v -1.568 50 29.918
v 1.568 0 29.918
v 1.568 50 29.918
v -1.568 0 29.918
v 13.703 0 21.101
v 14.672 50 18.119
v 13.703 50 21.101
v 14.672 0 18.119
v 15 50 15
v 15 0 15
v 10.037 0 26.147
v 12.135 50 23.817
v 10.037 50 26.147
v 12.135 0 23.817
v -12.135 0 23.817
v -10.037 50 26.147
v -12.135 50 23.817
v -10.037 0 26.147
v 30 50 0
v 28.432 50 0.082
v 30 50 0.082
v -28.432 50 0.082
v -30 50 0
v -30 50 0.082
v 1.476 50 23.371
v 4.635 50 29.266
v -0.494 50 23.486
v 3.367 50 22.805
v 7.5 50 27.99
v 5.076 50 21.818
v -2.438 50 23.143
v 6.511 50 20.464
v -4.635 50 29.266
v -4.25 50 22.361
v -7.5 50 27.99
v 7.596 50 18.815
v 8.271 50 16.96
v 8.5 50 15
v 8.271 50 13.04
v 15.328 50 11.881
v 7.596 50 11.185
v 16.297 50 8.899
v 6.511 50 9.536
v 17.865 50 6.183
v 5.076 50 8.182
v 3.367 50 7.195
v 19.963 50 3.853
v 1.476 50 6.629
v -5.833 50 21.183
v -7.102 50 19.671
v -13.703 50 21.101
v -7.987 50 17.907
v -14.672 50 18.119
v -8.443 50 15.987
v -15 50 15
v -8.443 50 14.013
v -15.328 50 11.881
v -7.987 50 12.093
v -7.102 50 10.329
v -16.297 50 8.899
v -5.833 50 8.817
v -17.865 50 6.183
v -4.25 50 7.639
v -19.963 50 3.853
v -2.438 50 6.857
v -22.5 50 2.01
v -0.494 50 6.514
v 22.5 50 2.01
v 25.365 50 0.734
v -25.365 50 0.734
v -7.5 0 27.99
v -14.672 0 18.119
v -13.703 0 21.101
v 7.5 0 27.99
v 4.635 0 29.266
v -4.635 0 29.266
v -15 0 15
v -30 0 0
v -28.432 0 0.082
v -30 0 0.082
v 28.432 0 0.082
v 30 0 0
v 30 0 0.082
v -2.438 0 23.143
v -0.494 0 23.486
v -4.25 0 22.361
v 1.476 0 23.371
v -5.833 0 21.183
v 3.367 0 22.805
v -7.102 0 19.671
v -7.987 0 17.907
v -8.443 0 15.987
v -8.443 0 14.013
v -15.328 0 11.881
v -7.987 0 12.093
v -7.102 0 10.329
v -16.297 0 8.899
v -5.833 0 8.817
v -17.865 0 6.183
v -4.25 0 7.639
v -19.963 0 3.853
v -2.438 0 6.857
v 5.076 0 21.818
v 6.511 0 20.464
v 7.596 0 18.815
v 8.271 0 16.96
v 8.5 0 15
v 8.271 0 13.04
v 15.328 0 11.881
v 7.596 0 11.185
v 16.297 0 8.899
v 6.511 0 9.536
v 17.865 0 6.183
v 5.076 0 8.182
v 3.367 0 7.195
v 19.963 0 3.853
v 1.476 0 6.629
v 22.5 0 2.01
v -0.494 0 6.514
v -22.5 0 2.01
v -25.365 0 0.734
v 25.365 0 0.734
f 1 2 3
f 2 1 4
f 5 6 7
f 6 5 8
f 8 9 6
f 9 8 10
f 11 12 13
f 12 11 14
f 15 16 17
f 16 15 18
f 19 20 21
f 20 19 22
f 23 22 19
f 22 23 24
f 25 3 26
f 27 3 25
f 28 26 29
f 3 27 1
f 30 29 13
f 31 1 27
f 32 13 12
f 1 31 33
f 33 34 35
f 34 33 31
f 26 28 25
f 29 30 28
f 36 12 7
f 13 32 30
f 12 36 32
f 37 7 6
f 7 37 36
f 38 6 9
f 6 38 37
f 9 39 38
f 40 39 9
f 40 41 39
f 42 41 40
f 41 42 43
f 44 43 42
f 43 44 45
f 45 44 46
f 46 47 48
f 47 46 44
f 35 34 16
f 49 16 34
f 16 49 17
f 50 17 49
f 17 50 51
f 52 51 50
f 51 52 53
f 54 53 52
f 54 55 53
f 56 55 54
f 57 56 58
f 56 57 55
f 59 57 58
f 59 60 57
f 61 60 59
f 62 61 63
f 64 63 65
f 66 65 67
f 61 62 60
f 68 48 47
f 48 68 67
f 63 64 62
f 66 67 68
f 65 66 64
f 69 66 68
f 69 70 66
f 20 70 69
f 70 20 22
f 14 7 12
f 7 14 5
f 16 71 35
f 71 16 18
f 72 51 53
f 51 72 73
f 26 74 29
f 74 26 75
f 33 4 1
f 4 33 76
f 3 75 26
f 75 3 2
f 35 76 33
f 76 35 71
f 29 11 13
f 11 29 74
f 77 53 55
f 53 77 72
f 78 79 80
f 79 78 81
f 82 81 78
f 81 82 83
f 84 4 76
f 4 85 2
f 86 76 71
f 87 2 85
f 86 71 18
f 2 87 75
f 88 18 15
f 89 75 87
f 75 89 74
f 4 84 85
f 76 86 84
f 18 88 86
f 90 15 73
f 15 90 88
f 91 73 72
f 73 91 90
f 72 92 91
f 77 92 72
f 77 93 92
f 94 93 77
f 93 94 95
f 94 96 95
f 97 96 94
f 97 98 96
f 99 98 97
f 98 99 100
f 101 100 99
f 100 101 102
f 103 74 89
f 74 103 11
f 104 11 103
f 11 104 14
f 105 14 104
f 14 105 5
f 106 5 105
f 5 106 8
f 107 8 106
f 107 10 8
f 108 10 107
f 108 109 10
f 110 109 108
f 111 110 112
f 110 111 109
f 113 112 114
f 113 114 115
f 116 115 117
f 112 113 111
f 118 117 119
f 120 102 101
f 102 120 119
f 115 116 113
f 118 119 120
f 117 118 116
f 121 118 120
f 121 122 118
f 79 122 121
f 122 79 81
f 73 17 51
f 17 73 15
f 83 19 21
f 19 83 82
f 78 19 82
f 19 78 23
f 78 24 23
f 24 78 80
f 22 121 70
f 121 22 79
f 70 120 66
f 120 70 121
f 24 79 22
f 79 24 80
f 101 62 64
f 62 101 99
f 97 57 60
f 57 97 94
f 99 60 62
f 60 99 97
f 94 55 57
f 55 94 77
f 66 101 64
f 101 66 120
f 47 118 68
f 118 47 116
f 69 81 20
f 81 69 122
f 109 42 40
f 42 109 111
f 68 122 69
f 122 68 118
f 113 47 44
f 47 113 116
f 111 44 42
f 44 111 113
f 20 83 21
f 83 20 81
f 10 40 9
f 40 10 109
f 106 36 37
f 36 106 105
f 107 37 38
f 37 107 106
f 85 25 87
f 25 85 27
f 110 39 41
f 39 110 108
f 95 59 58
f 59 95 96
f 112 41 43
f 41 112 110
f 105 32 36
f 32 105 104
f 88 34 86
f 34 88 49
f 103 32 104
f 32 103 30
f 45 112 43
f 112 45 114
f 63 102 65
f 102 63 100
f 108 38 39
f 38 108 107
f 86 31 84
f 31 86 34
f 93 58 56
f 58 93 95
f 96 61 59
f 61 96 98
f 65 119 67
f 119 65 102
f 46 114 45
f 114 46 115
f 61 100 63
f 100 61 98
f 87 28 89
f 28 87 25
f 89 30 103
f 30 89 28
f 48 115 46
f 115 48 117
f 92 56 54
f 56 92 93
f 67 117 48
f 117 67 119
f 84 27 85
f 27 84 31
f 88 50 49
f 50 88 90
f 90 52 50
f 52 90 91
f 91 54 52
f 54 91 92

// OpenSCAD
// file: variables.scad
// General
DIFFERENCE_FIX = 0.1;
DIFFERENCE_FIX_NEGATIVE = -1 * DIFFERENCE_FIX;
DIFFERENCE_FIX_2 = 2 * DIFFERENCE_FIX;

// Hull
hullThickness = 3;

// Nose
noseLength = 100;
noseWidth = 70 - hullThickness * 2;
noseTopThickness = 1;
noseTopOffsetZ = 60;
noseTopEndOffset = 20;
noseTopSharpnessFactor = 4;
noseBotttomSharpnessFactor = 3;
noseTopThicknessFactor = 1;
noseBottomThicknessFactor = 3;

// Hull
hullLength = 500 - hullThickness * 2;
hullSpacing = 100;
hullCutoutWidth = 46;
hullCutoutHeight = 150;
hullHeight = noseTopOffsetZ + noseTopThickness + hullThickness;

// Hull Mounts
hullMountHole = 8.5;
hullMountHeight = 30;
hullMountWidth = 30;
hullMountDepth = 50;
hullMountPinRadius = 5;
hullMountPinOffset = 10;
hullMountOffsetY = 100;

// Rod Connectors
rodConnectorWidth = 30;
rodConnectorRadius = 15;
rodConnectorTopOffset = 3;
rodConnectorOffsetX = 30;

// Lid
lidLip = 5;
lidThickness = 3;
lidGap = 0.4;
// main file
include <variables.scad>

module hullMount() {
    difference() {
        hullMountBody();

        // Hole
        translate([0, hullMountDepth + DIFFERENCE_FIX, hullMountHeight / 2])
        rotate([90, 0, 0])
        cylinder(h = hullMountDepth + DIFFERENCE_FIX_2, r = hullMountHole);
    }
}

module hullMountBody() {
    difference() {
        union() {
            translate([0, hullMountDepth, hullMountHeight / 2])
            rotate([90, 0, 0])
            cylinder(h = hullMountDepth, r = hullMountHeight / 2);

            translate([-hullMountWidth, 0, 0])
            cube([hullMountWidth * 2, hullMountDepth, hullMountHeight / 2]);
        }

        translate([-hullMountWidth, hullMountDepth + DIFFERENCE_FIX, hullMountHeight / 2])
        rotate([90, 0, 0])
        cylinder(h = hullMountDepth + DIFFERENCE_FIX_2, r = hullMountHeight / 2);

        translate([hullMountWidth, hullMountDepth + DIFFERENCE_FIX, hullMountHeight / 2])
        rotate([90, 0, 0])
        cylinder(h = hullMountDepth + DIFFERENCE_FIX_2, r = hullMountHeight / 2);
    }
}

hullMount();
